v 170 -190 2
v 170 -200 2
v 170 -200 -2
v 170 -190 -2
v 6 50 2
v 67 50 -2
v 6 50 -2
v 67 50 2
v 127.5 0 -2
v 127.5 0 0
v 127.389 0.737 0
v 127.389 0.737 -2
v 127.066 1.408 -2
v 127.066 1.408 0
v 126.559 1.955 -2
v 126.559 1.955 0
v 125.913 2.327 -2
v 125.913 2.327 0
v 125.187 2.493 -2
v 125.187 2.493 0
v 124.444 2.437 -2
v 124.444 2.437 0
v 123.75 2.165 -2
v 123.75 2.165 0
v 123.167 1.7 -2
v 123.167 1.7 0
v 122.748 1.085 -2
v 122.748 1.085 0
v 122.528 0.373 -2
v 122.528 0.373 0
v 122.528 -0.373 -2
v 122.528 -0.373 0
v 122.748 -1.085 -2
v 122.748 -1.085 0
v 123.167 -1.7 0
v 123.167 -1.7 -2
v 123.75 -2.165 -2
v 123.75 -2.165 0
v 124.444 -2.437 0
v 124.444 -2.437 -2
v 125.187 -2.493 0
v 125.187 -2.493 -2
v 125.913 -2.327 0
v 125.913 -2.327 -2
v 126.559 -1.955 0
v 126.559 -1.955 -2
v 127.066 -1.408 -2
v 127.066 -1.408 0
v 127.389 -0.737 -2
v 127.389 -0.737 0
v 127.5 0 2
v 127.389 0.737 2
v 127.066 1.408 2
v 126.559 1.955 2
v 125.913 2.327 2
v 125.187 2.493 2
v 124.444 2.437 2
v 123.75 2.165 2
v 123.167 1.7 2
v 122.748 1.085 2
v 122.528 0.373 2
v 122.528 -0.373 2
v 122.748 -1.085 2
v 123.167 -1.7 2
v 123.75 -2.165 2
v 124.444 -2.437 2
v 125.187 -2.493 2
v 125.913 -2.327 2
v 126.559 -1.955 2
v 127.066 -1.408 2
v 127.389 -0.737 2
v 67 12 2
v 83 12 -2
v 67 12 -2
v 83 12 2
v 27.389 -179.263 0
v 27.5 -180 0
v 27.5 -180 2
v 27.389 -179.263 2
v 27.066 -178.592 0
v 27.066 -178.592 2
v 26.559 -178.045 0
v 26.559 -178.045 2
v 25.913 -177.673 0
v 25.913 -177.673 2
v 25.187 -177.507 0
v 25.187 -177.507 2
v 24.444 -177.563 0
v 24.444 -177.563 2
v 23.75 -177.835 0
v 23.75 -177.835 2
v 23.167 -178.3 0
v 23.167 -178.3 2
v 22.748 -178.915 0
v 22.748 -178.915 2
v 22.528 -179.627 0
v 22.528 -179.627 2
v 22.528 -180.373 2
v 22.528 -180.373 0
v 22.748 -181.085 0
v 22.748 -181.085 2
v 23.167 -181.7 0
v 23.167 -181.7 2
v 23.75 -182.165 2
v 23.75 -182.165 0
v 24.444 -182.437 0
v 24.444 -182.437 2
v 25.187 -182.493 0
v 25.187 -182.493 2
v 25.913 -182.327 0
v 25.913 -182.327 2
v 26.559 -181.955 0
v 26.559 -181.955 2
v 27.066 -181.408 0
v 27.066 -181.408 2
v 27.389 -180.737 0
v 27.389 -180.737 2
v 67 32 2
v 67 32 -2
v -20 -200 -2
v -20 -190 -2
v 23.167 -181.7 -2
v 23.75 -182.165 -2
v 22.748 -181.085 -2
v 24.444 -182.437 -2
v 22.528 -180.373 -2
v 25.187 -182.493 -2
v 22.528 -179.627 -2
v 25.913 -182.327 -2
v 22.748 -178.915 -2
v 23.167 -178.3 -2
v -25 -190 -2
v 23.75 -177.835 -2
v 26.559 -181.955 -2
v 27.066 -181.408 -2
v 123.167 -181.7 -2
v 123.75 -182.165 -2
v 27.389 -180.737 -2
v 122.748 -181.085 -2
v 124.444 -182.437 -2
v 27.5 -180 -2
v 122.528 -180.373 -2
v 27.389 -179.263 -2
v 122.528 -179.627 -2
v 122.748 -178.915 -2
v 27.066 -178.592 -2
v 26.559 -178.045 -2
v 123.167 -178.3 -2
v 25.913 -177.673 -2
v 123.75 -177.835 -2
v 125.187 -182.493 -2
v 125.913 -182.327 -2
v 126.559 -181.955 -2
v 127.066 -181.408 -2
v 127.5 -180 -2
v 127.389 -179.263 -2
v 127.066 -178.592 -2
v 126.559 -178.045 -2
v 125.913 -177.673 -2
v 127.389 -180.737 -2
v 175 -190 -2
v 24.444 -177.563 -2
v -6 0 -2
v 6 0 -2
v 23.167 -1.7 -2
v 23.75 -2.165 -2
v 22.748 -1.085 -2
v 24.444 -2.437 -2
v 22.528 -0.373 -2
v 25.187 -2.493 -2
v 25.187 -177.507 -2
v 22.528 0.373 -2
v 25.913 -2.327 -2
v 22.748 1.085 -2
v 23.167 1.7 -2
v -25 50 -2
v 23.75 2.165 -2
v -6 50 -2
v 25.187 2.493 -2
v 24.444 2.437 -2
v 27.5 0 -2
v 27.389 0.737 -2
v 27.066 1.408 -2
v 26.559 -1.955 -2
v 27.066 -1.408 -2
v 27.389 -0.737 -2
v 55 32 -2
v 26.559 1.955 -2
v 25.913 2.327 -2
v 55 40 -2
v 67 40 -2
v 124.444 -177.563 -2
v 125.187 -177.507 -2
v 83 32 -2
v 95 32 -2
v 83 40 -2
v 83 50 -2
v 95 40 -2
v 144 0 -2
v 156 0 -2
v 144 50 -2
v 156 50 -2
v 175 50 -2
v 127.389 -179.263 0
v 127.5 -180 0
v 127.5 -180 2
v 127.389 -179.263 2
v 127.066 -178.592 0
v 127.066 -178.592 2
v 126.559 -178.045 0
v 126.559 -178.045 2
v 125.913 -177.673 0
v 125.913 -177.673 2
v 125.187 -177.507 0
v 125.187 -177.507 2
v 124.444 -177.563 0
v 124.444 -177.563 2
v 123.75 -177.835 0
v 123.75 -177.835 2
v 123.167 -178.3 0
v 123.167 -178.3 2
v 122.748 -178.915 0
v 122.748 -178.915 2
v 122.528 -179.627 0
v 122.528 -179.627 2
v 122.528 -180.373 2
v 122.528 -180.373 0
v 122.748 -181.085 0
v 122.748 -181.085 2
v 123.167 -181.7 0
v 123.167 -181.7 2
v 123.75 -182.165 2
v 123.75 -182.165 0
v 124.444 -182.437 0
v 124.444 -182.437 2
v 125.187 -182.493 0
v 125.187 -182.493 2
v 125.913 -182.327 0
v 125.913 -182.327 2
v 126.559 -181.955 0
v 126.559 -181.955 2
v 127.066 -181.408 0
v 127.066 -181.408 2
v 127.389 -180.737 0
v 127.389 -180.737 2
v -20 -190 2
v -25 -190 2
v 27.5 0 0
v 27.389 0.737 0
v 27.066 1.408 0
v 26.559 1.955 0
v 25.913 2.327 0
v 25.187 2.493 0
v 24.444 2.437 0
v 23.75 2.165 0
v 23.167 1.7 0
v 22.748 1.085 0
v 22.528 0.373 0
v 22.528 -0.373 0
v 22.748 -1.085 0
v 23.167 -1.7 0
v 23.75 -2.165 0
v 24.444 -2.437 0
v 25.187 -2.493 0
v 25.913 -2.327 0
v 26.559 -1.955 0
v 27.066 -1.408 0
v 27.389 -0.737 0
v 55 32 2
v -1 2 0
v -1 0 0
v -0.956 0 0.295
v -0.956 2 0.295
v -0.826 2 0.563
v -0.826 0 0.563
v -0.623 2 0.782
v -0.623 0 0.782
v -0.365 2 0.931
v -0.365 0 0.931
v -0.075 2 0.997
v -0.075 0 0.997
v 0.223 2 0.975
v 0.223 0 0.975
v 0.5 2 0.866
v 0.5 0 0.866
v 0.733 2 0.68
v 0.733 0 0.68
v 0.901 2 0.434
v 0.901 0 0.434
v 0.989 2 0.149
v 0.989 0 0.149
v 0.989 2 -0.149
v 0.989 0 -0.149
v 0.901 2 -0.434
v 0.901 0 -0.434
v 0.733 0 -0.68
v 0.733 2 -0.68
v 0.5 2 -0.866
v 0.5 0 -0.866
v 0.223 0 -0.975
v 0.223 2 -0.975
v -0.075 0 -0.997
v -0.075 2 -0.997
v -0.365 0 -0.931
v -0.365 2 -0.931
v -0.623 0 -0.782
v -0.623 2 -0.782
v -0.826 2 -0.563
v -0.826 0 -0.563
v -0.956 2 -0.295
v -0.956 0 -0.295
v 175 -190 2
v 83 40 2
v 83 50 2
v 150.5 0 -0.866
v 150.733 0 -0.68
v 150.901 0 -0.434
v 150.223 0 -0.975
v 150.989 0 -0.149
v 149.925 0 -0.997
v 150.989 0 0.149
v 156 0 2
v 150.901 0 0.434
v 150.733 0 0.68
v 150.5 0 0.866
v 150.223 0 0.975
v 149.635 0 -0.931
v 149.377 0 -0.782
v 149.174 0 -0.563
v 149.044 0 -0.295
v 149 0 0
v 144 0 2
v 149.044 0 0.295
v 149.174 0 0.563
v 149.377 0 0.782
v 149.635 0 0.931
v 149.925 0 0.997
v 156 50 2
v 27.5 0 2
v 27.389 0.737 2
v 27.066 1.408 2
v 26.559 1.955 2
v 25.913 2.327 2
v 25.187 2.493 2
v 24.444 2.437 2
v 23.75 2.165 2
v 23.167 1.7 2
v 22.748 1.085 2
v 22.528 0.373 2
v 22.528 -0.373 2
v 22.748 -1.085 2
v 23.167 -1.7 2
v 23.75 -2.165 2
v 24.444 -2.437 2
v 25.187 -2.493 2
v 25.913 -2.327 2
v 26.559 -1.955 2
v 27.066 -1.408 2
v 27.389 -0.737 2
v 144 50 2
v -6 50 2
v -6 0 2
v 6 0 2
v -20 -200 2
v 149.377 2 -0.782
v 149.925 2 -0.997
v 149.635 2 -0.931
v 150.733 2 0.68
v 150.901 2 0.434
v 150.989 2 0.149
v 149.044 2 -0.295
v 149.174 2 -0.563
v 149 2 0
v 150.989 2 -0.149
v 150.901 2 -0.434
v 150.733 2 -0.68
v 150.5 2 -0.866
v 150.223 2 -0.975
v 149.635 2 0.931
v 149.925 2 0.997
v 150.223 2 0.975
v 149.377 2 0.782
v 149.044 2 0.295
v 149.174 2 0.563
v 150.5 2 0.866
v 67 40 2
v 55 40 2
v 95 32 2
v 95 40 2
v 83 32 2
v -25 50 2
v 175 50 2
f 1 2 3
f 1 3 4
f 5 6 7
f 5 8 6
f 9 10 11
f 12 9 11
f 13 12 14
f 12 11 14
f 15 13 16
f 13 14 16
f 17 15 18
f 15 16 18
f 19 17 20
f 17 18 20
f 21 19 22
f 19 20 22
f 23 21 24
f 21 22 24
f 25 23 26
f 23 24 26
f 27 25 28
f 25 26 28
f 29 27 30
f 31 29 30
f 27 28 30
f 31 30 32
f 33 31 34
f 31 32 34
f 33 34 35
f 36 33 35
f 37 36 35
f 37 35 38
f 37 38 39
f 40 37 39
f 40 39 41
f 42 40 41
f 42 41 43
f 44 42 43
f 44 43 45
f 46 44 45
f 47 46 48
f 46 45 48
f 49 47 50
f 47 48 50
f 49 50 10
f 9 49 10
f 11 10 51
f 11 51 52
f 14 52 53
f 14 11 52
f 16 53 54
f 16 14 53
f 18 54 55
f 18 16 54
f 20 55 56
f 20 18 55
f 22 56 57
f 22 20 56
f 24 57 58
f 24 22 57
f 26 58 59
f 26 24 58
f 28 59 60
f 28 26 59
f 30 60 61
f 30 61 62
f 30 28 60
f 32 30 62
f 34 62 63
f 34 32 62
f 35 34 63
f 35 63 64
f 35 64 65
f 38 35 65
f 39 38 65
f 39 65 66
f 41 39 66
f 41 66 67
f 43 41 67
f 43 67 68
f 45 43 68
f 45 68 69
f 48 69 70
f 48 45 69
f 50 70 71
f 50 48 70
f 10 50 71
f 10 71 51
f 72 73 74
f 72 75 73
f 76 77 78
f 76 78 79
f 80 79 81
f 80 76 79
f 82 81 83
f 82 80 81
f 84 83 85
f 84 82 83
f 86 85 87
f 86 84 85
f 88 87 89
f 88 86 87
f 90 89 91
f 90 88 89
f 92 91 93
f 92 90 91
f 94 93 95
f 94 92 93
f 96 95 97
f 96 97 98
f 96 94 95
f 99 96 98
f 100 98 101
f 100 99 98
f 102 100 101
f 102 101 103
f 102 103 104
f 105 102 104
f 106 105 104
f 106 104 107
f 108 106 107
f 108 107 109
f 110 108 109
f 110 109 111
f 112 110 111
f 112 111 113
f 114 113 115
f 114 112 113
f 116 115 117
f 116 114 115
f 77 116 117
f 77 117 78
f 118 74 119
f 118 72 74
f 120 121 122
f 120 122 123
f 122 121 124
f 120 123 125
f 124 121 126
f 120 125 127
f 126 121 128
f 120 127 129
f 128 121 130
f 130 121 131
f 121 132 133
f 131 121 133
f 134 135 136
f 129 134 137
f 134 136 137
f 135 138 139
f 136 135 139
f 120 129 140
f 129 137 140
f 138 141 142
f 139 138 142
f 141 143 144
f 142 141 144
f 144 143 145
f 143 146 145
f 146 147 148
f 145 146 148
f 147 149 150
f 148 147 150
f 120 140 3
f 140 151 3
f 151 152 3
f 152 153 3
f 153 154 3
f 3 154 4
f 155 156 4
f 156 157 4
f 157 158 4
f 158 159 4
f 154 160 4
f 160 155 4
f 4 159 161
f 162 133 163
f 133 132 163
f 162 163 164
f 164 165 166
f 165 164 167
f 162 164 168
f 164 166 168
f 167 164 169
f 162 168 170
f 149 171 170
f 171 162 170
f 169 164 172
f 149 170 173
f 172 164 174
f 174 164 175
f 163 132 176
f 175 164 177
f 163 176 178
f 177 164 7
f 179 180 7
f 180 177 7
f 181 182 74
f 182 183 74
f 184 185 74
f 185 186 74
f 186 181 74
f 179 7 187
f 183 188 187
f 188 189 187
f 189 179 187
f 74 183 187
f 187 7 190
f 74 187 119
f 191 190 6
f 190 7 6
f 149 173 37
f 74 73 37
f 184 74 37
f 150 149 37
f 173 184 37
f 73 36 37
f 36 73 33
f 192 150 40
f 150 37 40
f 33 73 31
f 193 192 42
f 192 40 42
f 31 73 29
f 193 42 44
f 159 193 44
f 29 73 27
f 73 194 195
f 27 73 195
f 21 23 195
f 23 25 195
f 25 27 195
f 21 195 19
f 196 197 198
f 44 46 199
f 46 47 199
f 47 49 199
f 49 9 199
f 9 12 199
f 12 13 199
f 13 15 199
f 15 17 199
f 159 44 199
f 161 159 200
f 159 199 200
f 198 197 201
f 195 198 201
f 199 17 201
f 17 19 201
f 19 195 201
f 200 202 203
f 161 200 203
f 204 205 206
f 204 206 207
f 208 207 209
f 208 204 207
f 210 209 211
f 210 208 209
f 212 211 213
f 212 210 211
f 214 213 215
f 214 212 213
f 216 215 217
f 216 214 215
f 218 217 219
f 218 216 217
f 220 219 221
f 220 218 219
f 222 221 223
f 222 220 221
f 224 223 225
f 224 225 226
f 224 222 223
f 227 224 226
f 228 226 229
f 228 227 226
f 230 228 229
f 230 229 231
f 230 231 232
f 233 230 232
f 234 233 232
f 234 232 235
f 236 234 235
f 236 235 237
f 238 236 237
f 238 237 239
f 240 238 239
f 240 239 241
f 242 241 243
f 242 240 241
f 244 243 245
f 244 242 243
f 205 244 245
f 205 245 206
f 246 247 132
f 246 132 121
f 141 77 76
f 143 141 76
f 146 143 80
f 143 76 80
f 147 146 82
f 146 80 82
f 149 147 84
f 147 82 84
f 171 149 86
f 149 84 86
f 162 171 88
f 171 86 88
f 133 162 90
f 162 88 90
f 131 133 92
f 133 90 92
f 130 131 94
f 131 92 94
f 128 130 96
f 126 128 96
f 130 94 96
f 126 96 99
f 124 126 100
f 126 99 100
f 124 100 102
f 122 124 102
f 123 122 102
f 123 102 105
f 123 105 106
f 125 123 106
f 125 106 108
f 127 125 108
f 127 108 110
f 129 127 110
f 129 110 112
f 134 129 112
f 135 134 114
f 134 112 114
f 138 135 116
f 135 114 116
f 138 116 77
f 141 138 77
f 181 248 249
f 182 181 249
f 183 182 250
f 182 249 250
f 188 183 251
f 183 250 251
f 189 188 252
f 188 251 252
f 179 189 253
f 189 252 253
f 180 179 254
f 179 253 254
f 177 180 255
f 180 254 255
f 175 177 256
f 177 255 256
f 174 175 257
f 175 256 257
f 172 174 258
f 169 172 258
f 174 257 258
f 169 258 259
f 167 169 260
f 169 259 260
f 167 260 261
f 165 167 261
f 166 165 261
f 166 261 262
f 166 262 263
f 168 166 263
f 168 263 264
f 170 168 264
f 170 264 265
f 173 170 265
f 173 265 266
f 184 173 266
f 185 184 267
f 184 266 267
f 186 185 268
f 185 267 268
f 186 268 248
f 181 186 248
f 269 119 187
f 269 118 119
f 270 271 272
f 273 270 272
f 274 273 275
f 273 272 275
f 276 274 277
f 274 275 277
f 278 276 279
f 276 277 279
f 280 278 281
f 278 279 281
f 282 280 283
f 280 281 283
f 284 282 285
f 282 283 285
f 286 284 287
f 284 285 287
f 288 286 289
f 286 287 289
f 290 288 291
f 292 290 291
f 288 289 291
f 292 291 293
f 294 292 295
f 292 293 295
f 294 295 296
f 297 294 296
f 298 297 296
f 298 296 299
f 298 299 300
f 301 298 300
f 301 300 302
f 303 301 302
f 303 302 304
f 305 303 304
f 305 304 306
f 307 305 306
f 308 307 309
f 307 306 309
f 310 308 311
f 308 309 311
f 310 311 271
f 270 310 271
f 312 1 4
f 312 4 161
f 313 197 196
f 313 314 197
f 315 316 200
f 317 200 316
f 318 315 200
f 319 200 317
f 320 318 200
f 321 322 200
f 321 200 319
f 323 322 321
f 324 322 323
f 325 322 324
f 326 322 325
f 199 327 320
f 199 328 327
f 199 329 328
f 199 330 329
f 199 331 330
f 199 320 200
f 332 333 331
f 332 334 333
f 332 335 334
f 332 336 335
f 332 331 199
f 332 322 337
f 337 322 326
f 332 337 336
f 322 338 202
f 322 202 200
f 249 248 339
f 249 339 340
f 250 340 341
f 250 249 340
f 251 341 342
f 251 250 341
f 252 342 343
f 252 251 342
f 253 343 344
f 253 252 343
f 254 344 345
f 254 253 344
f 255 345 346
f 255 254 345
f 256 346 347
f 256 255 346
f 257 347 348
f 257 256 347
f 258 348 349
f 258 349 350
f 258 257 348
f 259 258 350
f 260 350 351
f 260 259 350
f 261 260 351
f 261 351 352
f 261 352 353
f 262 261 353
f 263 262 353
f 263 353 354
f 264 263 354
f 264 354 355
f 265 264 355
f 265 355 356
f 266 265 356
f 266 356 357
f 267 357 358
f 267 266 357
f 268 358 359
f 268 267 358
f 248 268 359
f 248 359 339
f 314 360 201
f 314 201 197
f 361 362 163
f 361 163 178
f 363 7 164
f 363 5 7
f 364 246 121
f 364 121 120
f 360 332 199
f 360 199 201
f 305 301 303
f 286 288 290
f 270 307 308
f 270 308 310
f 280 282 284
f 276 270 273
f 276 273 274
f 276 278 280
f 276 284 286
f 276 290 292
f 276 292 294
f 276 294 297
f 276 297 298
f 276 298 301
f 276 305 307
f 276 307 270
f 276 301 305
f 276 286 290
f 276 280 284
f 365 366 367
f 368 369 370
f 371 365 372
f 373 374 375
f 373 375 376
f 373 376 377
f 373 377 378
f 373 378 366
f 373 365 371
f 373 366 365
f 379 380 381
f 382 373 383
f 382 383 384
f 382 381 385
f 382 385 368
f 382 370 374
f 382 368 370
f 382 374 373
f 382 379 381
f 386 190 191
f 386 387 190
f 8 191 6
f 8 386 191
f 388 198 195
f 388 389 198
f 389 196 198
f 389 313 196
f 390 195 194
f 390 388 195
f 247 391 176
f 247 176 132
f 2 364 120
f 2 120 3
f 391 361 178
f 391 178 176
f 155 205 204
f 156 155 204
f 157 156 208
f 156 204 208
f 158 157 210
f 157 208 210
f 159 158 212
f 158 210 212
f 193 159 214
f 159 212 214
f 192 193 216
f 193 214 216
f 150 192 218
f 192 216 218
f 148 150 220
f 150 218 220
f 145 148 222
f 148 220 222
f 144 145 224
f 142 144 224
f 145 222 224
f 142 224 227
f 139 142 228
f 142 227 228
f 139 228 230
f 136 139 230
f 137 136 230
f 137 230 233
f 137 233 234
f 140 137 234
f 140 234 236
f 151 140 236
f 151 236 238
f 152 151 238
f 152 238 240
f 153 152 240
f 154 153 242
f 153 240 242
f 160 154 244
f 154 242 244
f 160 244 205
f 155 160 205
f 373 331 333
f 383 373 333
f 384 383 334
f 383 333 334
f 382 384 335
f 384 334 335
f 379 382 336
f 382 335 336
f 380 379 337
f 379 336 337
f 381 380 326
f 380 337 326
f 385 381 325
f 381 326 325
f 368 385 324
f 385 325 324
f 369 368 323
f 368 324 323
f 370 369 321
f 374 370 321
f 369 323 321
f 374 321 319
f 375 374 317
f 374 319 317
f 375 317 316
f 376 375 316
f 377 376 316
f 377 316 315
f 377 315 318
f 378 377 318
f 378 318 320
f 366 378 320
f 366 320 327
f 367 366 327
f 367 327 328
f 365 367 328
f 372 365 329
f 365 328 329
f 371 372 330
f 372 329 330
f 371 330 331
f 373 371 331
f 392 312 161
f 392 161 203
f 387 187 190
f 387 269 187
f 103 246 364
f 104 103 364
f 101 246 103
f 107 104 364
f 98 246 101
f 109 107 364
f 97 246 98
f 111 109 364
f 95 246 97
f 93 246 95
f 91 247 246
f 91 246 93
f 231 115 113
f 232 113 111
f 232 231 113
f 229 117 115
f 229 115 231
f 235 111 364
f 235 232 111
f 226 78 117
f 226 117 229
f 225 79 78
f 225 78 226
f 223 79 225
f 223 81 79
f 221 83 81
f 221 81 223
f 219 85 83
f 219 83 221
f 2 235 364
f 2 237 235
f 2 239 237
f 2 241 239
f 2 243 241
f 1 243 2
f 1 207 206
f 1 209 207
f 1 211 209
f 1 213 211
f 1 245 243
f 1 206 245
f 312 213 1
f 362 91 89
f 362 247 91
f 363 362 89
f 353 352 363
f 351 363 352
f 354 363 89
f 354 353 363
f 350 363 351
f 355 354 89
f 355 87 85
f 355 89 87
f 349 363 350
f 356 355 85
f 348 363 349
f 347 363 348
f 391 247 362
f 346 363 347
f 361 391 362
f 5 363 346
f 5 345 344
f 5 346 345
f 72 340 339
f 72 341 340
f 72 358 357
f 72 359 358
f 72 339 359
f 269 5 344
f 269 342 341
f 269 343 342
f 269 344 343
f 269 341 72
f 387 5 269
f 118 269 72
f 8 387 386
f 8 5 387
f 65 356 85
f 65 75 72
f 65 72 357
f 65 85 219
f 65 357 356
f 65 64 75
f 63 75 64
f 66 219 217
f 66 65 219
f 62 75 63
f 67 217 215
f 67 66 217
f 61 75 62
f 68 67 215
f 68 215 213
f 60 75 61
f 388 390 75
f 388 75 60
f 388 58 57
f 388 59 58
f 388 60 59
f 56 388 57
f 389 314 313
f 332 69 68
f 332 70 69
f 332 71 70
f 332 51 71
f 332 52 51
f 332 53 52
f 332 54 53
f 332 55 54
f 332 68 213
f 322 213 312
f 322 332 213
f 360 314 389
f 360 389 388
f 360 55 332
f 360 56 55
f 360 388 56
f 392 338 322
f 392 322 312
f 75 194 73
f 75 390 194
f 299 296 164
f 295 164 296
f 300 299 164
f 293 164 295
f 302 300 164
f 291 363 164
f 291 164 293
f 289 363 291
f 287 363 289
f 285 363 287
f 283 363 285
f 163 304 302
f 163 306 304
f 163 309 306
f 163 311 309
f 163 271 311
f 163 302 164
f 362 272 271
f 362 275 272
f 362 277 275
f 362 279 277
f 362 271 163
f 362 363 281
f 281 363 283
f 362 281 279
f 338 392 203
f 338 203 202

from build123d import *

# Parameters (mm, degrees)
F0_R          = 2.5
F1_DEPTH      = 2
F1_DEPTH_BACK = 2
F2_R          = 1
F3_DEPTH      = 2


with BuildPart() as f1:
    # F0 (on Top) → F1 (new body, two sides)
    with BuildSketch(Plane.XY) as f1_sk:
        Polygon((6, 0), (-6, 0), (-6, 50), (-25, 50), (-25, -190), (-20, -190), (-20, -200), (170, -200), (170, -190), (175, -190), (175, 50), (156, 50), (156, 0), (144, 0), (144, 50), (83, 50), (83, 40), (95, 40), (95, 32), (83, 32), (83, 12), (67, 12), (67, 32), (55, 32), (55, 40), (67, 40), (67, 50), (6, 50), align=None)
        with Locations((25, -180)):
            Circle(F0_R, mode=Mode.SUBTRACT)
        with Locations((125, -180)):
            Circle(F0_R, mode=Mode.SUBTRACT)
        with Locations((25, 0)):
            Circle(F0_R, mode=Mode.SUBTRACT)
        with Locations((125, 0)):
            Circle(F0_R, mode=Mode.SUBTRACT)
    extrude(amount=F1_DEPTH)
    extrude(f1_sk.sketch, amount=-F1_DEPTH_BACK)

    # F2 (on face) → F3 (join)
    with BuildSketch(Plane(origin=(0, 0, 0), x_dir=(-1, 0, 0), z_dir=(0, 1, 0))):
        with Locations((-150, 0)):
            Circle(F2_R)
        Circle(F2_R)
    extrude(amount=F3_DEPTH)


solid = f1.part
